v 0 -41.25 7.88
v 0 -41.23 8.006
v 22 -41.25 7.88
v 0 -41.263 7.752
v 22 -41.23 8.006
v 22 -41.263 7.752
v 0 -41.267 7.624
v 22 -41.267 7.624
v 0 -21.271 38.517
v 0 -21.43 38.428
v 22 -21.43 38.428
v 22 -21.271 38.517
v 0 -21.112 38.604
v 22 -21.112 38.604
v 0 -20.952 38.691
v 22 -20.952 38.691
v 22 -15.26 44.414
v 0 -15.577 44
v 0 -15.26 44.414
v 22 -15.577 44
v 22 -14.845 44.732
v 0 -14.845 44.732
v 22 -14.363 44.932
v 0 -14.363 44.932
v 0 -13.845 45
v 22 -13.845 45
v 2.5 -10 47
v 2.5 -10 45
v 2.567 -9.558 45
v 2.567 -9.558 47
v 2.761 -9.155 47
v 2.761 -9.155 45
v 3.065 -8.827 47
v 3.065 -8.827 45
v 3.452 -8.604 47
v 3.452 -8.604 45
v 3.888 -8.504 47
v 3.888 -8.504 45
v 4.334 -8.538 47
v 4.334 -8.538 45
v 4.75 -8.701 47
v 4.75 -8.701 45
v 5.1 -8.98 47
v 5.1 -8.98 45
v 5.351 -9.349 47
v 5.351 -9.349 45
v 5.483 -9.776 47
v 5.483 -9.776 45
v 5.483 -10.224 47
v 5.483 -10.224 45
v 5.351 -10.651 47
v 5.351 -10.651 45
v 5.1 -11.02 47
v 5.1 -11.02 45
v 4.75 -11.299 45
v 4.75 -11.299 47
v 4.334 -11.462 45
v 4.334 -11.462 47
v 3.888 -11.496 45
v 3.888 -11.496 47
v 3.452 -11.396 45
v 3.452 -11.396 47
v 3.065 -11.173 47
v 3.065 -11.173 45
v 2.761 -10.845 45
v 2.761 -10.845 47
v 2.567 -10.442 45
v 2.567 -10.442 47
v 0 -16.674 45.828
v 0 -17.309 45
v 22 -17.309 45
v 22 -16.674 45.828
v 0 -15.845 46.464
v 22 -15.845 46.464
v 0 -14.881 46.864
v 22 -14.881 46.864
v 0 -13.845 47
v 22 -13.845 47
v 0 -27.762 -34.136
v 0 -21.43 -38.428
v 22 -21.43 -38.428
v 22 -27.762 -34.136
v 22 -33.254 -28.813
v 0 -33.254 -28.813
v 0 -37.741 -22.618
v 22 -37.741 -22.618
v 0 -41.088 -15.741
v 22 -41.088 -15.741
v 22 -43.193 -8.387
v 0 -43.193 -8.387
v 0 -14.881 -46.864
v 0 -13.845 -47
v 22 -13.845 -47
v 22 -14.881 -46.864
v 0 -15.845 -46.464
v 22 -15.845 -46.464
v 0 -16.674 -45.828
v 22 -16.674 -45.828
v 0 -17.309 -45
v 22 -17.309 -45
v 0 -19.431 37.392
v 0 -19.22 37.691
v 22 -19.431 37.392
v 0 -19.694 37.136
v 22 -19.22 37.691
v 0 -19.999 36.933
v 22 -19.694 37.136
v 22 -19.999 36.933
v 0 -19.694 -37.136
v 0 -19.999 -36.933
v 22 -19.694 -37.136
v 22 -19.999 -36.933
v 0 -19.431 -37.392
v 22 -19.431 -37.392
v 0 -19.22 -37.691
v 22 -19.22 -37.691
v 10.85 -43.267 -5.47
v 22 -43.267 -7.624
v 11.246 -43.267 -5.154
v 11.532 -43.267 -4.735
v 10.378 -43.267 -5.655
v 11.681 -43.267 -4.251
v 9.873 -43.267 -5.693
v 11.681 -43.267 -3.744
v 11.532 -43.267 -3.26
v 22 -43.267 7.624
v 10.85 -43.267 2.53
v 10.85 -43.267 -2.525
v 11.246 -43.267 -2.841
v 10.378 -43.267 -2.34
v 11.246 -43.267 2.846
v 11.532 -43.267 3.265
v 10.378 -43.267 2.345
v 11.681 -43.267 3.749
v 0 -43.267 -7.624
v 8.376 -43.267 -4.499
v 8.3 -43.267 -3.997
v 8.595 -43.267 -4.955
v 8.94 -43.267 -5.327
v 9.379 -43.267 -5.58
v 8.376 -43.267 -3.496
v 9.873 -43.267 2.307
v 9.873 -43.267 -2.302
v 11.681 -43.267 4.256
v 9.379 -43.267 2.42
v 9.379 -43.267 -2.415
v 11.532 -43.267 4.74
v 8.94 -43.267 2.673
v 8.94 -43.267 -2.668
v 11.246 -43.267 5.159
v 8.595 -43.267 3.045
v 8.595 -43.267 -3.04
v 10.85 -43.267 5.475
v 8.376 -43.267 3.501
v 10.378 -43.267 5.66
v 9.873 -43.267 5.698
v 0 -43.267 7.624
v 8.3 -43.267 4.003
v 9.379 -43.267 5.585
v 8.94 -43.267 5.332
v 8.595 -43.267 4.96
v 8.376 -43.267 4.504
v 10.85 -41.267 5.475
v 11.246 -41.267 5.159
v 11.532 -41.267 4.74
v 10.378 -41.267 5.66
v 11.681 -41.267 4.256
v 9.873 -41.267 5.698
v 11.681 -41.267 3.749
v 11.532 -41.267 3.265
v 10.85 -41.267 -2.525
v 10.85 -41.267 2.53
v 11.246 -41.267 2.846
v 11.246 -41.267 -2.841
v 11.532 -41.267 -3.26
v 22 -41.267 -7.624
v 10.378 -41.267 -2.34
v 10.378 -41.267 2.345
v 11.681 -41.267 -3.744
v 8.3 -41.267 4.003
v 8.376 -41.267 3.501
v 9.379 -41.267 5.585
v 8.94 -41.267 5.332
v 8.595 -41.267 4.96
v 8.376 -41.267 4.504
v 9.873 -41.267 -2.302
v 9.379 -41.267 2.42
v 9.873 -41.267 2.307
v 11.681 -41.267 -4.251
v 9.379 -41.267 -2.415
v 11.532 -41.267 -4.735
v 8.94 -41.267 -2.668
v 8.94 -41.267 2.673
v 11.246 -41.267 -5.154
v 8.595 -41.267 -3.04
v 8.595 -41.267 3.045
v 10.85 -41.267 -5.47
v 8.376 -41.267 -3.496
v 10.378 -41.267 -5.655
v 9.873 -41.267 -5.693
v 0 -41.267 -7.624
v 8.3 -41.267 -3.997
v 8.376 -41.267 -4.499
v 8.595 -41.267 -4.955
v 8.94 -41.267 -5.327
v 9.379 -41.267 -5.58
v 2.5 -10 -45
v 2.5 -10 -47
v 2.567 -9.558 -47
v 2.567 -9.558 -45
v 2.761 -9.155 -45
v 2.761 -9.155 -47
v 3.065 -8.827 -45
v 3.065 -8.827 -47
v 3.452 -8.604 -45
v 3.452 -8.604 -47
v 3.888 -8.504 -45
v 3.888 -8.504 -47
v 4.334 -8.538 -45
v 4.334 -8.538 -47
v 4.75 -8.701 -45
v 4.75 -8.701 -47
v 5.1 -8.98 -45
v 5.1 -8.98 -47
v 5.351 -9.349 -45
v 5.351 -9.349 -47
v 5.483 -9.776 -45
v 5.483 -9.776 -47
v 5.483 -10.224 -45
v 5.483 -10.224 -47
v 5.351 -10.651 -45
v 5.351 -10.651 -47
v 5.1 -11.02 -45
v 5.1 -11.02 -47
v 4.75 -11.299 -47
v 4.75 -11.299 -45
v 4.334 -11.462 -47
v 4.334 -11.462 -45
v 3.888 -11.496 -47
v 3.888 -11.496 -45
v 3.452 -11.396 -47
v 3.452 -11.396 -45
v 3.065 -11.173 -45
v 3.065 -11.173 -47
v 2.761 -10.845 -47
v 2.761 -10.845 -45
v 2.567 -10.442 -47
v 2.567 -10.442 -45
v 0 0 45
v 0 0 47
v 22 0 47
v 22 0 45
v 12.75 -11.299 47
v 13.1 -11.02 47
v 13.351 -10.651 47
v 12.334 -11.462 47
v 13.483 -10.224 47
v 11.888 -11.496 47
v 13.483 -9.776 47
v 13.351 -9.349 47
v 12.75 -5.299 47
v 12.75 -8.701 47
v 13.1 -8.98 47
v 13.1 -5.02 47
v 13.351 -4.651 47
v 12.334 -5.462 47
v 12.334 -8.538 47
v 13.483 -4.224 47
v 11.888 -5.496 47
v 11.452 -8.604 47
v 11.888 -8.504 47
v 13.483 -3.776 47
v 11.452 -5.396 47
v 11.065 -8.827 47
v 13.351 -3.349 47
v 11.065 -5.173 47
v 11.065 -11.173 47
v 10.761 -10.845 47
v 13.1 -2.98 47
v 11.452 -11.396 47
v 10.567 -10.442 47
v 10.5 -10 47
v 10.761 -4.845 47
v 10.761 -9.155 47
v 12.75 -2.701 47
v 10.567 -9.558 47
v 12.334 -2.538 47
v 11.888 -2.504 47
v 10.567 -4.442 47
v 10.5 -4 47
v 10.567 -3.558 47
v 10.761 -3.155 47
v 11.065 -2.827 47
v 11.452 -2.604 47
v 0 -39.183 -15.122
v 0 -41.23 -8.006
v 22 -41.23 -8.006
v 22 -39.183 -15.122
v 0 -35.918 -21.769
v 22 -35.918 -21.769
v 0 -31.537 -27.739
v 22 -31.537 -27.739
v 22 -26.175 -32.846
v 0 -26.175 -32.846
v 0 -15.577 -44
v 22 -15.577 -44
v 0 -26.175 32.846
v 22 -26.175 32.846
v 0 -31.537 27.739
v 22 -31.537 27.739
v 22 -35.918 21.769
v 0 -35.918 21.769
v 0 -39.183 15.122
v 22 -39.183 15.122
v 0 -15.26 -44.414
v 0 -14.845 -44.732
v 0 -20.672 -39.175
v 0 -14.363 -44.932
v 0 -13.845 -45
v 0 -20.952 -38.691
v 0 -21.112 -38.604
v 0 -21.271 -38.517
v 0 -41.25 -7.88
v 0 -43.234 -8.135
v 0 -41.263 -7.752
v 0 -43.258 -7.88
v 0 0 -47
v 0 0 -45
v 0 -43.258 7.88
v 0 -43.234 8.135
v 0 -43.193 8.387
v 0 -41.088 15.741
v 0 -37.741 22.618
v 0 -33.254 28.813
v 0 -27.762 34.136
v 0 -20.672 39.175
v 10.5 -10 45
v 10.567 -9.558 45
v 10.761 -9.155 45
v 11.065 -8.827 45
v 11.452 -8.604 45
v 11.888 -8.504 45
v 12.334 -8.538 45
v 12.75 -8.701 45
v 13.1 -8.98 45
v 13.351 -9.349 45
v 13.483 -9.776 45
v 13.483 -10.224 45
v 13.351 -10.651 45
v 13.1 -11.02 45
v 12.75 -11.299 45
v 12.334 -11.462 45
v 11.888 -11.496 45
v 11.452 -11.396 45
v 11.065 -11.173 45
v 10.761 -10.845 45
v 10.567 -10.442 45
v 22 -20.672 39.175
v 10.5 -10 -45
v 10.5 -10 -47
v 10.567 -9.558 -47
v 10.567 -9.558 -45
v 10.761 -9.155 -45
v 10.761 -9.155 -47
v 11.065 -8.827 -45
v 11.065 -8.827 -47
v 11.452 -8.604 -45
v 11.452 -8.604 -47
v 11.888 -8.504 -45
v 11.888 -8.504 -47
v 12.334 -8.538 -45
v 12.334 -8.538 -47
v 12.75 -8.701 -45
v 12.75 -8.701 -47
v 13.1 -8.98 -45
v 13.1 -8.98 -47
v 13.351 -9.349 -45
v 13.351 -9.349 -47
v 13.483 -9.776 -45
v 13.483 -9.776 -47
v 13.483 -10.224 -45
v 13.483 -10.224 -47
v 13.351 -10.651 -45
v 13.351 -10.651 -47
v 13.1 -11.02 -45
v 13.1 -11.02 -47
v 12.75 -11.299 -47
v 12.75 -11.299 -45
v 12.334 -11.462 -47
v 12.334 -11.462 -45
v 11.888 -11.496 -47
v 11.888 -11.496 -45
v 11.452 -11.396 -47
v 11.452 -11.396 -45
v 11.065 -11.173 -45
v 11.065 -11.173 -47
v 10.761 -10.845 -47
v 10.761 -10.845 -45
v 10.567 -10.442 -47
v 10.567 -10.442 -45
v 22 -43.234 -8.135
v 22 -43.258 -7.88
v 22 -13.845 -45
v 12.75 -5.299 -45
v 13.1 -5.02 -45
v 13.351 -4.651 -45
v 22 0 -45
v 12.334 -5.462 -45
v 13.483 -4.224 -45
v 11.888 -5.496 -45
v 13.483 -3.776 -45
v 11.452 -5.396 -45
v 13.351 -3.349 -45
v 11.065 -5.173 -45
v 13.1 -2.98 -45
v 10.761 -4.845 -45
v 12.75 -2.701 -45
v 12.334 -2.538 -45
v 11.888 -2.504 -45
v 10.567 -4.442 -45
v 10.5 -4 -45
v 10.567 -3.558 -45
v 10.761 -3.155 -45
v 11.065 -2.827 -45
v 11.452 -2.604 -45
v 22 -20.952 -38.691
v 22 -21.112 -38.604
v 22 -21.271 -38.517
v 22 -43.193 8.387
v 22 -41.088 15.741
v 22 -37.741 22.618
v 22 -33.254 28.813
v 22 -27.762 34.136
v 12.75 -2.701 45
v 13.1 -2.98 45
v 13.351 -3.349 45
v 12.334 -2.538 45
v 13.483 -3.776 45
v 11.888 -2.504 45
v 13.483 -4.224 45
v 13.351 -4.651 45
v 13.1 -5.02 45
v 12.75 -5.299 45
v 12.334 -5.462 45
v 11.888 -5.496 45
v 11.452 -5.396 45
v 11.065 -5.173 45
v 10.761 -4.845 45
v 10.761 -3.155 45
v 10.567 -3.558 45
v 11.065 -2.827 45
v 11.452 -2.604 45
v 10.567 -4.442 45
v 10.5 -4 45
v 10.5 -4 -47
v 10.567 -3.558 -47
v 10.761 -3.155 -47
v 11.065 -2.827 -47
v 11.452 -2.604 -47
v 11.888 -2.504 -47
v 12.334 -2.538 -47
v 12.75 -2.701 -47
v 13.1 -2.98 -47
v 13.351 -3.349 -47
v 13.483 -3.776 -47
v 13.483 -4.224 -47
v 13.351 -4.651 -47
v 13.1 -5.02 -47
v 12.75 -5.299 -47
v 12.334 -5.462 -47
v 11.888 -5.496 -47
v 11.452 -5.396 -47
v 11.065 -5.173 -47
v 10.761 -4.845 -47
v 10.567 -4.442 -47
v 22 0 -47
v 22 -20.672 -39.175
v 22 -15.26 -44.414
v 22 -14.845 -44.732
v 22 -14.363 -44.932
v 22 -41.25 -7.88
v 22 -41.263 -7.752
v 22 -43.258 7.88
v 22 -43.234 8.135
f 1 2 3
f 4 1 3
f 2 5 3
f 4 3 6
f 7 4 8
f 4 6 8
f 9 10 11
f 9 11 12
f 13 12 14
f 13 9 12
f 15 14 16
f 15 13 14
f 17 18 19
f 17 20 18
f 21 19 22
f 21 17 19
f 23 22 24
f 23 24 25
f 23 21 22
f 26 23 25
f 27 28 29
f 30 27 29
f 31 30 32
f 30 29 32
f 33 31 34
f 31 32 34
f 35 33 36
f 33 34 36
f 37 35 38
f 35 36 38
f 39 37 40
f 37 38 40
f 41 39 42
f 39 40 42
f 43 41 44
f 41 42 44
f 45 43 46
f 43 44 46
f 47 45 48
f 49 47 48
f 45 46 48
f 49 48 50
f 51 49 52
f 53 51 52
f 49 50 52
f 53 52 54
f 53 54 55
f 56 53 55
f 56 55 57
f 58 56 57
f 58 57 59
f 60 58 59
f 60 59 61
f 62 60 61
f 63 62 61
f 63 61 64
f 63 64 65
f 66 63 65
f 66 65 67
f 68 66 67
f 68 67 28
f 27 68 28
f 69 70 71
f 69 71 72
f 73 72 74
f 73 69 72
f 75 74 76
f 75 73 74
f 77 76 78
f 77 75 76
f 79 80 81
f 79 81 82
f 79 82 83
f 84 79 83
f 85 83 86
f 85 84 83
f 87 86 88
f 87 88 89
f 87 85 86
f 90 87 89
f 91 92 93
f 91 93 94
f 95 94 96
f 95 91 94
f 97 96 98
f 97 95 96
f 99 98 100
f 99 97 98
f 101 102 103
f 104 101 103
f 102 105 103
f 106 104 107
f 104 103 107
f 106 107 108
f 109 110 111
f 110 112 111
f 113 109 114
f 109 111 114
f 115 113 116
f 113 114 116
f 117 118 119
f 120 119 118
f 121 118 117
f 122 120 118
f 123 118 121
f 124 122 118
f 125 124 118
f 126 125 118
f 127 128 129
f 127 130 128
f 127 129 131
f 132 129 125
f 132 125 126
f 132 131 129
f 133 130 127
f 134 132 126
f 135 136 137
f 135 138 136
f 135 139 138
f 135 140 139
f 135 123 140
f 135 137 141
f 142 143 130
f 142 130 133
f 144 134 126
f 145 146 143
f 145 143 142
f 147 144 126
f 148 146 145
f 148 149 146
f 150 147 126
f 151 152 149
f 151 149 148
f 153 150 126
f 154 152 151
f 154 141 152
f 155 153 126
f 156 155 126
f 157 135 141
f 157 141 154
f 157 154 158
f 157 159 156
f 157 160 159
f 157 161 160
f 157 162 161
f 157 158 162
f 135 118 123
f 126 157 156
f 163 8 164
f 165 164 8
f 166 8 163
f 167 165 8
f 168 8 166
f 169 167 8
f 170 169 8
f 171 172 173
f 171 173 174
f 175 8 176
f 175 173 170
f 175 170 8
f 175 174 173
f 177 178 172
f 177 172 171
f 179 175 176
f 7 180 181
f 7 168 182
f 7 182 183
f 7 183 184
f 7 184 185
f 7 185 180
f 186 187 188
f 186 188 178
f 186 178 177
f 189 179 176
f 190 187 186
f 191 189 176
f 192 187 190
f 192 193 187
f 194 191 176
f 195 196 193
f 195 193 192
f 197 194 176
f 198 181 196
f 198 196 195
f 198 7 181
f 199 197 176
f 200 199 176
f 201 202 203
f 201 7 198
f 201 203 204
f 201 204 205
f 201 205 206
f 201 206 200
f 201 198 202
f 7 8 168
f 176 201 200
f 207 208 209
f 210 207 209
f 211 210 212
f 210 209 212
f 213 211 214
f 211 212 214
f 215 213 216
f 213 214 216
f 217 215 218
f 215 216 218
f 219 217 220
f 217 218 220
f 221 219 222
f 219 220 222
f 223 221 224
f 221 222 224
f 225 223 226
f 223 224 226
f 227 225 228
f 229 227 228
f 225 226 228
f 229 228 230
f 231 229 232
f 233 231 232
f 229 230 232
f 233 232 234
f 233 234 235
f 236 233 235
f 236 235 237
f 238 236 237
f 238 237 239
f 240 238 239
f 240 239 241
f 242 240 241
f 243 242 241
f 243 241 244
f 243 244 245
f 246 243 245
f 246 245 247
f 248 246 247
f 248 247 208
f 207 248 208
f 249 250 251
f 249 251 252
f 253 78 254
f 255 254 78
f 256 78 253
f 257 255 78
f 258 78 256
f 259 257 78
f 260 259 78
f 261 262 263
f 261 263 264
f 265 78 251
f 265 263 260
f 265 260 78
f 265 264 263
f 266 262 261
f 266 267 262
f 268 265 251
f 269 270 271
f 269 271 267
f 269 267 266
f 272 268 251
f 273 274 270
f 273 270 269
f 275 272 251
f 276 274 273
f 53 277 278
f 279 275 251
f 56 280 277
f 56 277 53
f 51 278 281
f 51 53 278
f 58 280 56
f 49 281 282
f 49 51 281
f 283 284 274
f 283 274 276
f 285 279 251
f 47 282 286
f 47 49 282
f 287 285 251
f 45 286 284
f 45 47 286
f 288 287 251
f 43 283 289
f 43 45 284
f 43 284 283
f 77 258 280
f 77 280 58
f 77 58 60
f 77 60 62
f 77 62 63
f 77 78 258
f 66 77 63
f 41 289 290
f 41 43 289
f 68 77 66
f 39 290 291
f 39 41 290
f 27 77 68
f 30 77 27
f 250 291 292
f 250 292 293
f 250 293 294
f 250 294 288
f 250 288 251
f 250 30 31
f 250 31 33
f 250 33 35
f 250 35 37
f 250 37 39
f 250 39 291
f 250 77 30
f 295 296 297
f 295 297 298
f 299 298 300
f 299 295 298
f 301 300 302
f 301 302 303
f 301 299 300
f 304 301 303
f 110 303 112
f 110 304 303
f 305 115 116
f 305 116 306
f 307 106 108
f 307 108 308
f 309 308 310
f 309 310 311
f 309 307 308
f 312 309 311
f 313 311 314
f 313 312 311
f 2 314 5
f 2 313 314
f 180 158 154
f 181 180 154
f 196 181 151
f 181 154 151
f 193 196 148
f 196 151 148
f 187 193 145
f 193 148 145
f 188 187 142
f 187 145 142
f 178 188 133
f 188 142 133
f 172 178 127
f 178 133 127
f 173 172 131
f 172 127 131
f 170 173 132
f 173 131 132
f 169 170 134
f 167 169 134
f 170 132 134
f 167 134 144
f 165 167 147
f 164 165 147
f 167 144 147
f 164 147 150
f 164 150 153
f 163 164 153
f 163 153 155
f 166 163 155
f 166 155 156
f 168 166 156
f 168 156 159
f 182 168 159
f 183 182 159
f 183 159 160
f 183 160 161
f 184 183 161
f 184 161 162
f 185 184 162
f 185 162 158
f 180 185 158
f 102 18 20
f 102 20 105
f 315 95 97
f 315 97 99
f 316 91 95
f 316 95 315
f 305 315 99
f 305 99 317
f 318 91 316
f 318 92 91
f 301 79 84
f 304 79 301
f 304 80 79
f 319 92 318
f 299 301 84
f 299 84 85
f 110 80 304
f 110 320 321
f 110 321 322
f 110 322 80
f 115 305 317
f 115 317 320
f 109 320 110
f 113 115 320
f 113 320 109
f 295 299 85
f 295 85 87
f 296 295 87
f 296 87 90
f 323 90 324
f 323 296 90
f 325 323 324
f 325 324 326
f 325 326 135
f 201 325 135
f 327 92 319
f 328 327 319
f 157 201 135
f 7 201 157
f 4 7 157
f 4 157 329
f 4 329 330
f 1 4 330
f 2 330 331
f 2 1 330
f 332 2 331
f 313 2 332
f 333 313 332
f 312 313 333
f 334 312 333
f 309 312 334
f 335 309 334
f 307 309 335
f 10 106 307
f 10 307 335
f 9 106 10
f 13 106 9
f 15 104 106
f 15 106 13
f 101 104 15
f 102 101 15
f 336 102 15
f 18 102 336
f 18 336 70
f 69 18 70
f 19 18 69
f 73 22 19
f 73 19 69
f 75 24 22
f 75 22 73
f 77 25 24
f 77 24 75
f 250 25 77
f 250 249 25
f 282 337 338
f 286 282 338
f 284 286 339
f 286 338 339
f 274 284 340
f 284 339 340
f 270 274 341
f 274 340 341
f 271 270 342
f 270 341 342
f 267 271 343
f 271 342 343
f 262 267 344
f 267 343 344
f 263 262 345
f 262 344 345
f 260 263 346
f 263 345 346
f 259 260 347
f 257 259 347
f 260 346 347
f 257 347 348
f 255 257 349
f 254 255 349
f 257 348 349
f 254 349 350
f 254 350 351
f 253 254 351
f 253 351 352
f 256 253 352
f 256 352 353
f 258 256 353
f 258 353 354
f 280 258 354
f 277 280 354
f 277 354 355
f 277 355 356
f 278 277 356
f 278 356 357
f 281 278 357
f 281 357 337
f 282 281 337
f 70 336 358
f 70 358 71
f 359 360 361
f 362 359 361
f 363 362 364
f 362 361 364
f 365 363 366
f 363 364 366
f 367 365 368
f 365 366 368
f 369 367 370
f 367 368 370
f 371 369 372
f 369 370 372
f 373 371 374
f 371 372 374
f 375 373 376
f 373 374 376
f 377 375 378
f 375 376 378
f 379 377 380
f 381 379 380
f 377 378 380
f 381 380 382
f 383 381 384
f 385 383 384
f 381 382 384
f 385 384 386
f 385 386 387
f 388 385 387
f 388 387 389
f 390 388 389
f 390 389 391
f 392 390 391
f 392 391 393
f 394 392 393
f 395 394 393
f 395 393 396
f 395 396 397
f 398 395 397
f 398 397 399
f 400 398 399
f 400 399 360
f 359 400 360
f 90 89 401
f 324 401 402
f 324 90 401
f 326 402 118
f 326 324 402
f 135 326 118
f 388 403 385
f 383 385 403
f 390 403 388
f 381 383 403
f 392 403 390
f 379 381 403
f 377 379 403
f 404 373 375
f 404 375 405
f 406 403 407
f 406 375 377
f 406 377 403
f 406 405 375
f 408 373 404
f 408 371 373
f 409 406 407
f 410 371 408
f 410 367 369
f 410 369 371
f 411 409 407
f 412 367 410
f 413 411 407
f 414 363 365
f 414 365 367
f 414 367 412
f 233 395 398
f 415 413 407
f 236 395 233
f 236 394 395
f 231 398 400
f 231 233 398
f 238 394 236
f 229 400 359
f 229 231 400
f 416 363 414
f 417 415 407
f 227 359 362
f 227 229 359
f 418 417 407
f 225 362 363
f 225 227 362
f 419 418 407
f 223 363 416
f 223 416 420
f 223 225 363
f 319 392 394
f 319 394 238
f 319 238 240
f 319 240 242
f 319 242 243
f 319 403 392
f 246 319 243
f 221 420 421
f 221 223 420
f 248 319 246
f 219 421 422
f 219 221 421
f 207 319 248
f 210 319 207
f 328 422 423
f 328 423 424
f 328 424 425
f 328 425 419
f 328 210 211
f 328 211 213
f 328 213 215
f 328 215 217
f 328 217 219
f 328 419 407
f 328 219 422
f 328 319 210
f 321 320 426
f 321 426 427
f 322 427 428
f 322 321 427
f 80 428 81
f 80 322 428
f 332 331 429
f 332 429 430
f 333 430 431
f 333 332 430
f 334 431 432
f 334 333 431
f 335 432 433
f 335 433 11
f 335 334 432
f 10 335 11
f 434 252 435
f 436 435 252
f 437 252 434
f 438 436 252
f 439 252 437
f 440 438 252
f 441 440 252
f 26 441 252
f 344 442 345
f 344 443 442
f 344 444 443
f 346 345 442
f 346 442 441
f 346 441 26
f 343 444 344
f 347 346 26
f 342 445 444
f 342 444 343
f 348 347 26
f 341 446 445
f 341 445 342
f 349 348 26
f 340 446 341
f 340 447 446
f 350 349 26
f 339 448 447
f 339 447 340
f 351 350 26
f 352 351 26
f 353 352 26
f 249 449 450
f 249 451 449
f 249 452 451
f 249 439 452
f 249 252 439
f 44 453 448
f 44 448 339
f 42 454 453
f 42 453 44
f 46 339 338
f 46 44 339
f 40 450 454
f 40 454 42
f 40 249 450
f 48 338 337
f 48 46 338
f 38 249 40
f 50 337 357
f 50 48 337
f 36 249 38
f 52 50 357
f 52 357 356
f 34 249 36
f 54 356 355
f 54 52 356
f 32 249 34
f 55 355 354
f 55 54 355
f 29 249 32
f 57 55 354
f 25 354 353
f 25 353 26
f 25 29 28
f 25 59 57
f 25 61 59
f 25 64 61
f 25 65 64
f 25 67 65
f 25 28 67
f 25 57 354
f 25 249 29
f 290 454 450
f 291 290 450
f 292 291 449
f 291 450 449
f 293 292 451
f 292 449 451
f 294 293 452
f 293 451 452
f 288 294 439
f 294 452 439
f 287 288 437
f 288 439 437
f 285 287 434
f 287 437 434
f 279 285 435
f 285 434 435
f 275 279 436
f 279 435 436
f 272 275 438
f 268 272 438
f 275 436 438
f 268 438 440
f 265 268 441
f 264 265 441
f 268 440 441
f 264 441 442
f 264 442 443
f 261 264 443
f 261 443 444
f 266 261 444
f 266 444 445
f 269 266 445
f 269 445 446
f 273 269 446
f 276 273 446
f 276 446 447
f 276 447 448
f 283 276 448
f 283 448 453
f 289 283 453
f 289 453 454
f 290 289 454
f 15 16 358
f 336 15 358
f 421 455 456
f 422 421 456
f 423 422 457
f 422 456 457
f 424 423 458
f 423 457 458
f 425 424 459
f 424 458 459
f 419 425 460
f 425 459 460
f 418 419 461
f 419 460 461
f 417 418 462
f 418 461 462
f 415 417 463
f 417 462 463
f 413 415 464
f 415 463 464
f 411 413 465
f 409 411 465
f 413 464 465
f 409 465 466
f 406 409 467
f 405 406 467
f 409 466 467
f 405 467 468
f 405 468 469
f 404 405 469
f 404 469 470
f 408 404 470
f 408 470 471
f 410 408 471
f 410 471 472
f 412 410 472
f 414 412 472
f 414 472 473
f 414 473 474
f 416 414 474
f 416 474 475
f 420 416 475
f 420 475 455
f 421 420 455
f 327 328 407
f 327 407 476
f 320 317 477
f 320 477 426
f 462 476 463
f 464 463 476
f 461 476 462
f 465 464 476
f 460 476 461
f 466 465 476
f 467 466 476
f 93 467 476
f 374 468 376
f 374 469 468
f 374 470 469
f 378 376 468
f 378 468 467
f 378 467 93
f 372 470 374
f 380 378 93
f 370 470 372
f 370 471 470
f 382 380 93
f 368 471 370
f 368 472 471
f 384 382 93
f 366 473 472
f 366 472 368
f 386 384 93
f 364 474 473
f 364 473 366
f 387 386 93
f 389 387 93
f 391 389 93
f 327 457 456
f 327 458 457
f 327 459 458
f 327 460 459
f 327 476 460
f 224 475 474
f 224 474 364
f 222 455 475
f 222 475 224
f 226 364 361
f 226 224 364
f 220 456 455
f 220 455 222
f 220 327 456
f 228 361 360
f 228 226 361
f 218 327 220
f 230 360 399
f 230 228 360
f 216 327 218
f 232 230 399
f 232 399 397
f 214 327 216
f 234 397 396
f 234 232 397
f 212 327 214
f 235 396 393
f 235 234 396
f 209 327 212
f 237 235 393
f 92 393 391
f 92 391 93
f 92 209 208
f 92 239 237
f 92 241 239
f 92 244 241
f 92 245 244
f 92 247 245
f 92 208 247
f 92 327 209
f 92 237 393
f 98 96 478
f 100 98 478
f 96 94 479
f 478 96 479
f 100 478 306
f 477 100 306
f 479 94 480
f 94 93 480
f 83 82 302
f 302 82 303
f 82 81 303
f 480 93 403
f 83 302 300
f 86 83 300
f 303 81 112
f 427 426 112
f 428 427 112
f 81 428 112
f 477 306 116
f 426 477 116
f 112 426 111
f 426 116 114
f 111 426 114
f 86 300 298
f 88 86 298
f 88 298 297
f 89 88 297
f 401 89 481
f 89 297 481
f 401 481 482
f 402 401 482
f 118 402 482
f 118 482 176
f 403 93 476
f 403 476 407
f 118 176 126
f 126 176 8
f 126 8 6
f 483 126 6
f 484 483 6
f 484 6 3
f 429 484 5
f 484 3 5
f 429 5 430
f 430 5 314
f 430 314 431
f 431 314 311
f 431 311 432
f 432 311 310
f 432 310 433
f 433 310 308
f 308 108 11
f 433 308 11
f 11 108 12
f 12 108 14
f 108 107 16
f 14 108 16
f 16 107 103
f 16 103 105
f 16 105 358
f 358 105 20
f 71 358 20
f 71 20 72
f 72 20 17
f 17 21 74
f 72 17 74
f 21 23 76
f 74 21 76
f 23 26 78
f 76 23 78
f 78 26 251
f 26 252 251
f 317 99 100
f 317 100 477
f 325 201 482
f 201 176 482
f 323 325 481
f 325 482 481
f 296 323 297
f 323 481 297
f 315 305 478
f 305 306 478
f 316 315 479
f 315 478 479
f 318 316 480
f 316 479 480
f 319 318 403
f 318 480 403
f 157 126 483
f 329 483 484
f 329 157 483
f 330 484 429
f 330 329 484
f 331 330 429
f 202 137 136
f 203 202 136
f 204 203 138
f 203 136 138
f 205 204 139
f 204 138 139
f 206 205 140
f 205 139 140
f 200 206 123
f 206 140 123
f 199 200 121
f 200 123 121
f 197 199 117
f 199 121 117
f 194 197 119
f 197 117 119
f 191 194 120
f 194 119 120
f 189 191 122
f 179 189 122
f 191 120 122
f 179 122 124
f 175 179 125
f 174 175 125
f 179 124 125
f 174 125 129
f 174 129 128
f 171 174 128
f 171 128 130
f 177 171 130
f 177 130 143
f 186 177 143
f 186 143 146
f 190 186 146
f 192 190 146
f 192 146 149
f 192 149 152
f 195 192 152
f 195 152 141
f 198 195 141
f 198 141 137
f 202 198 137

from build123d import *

# Parameters (mm, degrees)
BOSS_EXTRUDE1_DEPTH   = 22
FILLET1_R             = 2
F_3_0MM_DOWEL_HOLE2_D = 3
CONVERT_SOLID1_DEPTH  = 22
M3_CLEARANCE_HOLE1_D  = 3.4


# Read off the part's stored shape, not the designer's step: Convert-Solid1
with BuildPart() as part:
    # Sketch1 → Boss-Extrude1 (new body)
    with BuildSketch(Plane(origin=(0, 0, 0), x_dir=(0, 0, -1), z_dir=(1, 0, 0))):
        with BuildLine():
            Line((-45, -15), (-37.195759655, -19.505780264))
            ThreePointArc((-37.195759655, -19.505780264), (-24.9972884, -33.75108254), (-7.814503261, -41.266615306))
            Line((-7.814503261, -41.266615306), (7.814503261, -41.266615306))
            ThreePointArc((7.814503261, -41.266615306), (24.9972884, -33.75108254), (37.195759655, -19.505780264))
            Line((37.195759655, -19.505780264), (45, -15))
            Line((45, -15), (45, 0))
            Line((45, 0), (47, 0))
            Line((47, 0), (47, -16.154700538))
            Line((47, -16.154700538), (38.691455747, -20.9516408))
            ThreePointArc((38.691455747, -20.9516408), (25.874940227, -35.587743231), (8, -43.266615306))
            Line((8, -43.266615306), (-8, -43.266615306))
            ThreePointArc((-8, -43.266615306), (-25.874940227, -35.587743231), (-38.691455747, -20.9516408))
            Line((-38.691455747, -20.9516408), (-47, -16.154700538))
            Line((-47, -16.154700538), (-47, 0))
            Line((-47, 0), (-45, 0))
            Line((-45, 0), (-45, -15))
        make_face()
    extrude(amount=BOSS_EXTRUDE1_DEPTH)

    # Fillet1
    fillet1_edges = [part.edges().sort_by_distance(p)[0] for p in [
        (11, -16.154700538, 47),
        (11, -15, 45),
        (11, -19.505780264, 37.195759655),
        (11, -41.266615306, 7.814503261),
        (11, -41.266615306, -7.814503261),
        (11, -19.505780264, -37.195759655),
        (11, -15, -45),
        (11, -16.154700538, -47),
        (11, -20.9516408, -38.691455747),
        (11, -43.266615306, -8),
        (11, -43.266615306, 8),
        (11, -20.9516408, 38.691455747),
    ]]
    fillet(fillet1_edges, radius=FILLET1_R)

    # Ø3.0mm Dowel Hole2 (through all)
    with Locations(Plane.XY.offset(47)):
        with Locations((4, -10), (12, -10), (12, -4)):
            Hole(F_3_0MM_DOWEL_HOLE2_D / 2)

    # Convert-Solid1 outline → Convert-Solid1 (cut)
    with BuildSketch(Plane.YZ):
        with BuildLine():
            ThreePointArc((-13.845299462, -47), (-15.845299462, -46.464101615), (-17.309401077, -45))
            Line((-17.309401077, -45), (-16.732050808, -46))
            ThreePointArc((-16.732050808, -46), (-16, -46.732050808), (-15, -47))
            Line((-15, -47), (-13.845299462, -47))
        make_face()
        with BuildLine():
            Line((-16.732050808, 46), (-17.309401077, 45))
            ThreePointArc((-17.309401077, 45), (-15.845299462, 46.464101615), (-13.845299462, 47))
            Line((-13.845299462, 47), (-15, 47))
            ThreePointArc((-15, 47), (-16, 46.732050808), (-16.732050808, 46))
        make_face()
        with BuildLine():
            ThreePointArc((-20.672392382, 39.175128193), (-21.000794949, 38.750427658), (-21.430336964, 38.428383489))
            ThreePointArc((-21.430336964, 38.428383489), (-21.191397112, 38.560662449), (-20.9516408, 38.691455747))
            Line((-20.9516408, 38.691455747), (-20.672392382, 39.175128193))
        make_face()
        with BuildLine():
            Line((-43.266615306, 7.814503261), (-43.266615306, 7.624494898))
            ThreePointArc((-43.266615306, 7.624494898), (-43.248238475, 8.007479152), (-43.193276836, 8.386944387))
            ThreePointArc((-43.193276836, 8.386944387), (-43.212600611, 8.286805686), (-43.231692225, 8.186622464))
            ThreePointArc((-43.231692225, 8.186622464), (-43.257865395, 8.001380442), (-43.266615306, 7.814503261))
        make_face()
        with BuildLine():
            ThreePointArc((-43.231692225, -8.186622464), (-43.212600611, -8.286805686), (-43.193276836, -8.386944387))
            ThreePointArc((-43.193276836, -8.386944387), (-43.248238475, -8.007479152), (-43.266615306, -7.624494898))
            Line((-43.266615306, -7.624494898), (-43.266615306, -7.814503261))
            ThreePointArc((-43.266615306, -7.814503261), (-43.257865395, -8.001380442), (-43.231692225, -8.186622464))
        make_face()
        with BuildLine():
            ThreePointArc((-21.430336964, -38.428383489), (-21.000794949, -38.750427658), (-20.672392382, -39.175128193))
            Line((-20.672392382, -39.175128193), (-20.9516408, -38.691455747))
            ThreePointArc((-20.9516408, -38.691455747), (-21.191397112, -38.560662449), (-21.430336964, -38.428383489))
        make_face()
    extrude(amount=CONVERT_SOLID1_DEPTH, mode=Mode.SUBTRACT)

    # M3 Clearance Hole1 (through all)
    with Locations(Plane(origin=(0, -41.266615306, 0), x_dir=(1, 0, 0), z_dir=(0, 1, 0))):
        with Locations((10, 3.99745139), (10, -4.00254861)):
            Hole(M3_CLEARANCE_HOLE1_D / 2)


solid = part.part
